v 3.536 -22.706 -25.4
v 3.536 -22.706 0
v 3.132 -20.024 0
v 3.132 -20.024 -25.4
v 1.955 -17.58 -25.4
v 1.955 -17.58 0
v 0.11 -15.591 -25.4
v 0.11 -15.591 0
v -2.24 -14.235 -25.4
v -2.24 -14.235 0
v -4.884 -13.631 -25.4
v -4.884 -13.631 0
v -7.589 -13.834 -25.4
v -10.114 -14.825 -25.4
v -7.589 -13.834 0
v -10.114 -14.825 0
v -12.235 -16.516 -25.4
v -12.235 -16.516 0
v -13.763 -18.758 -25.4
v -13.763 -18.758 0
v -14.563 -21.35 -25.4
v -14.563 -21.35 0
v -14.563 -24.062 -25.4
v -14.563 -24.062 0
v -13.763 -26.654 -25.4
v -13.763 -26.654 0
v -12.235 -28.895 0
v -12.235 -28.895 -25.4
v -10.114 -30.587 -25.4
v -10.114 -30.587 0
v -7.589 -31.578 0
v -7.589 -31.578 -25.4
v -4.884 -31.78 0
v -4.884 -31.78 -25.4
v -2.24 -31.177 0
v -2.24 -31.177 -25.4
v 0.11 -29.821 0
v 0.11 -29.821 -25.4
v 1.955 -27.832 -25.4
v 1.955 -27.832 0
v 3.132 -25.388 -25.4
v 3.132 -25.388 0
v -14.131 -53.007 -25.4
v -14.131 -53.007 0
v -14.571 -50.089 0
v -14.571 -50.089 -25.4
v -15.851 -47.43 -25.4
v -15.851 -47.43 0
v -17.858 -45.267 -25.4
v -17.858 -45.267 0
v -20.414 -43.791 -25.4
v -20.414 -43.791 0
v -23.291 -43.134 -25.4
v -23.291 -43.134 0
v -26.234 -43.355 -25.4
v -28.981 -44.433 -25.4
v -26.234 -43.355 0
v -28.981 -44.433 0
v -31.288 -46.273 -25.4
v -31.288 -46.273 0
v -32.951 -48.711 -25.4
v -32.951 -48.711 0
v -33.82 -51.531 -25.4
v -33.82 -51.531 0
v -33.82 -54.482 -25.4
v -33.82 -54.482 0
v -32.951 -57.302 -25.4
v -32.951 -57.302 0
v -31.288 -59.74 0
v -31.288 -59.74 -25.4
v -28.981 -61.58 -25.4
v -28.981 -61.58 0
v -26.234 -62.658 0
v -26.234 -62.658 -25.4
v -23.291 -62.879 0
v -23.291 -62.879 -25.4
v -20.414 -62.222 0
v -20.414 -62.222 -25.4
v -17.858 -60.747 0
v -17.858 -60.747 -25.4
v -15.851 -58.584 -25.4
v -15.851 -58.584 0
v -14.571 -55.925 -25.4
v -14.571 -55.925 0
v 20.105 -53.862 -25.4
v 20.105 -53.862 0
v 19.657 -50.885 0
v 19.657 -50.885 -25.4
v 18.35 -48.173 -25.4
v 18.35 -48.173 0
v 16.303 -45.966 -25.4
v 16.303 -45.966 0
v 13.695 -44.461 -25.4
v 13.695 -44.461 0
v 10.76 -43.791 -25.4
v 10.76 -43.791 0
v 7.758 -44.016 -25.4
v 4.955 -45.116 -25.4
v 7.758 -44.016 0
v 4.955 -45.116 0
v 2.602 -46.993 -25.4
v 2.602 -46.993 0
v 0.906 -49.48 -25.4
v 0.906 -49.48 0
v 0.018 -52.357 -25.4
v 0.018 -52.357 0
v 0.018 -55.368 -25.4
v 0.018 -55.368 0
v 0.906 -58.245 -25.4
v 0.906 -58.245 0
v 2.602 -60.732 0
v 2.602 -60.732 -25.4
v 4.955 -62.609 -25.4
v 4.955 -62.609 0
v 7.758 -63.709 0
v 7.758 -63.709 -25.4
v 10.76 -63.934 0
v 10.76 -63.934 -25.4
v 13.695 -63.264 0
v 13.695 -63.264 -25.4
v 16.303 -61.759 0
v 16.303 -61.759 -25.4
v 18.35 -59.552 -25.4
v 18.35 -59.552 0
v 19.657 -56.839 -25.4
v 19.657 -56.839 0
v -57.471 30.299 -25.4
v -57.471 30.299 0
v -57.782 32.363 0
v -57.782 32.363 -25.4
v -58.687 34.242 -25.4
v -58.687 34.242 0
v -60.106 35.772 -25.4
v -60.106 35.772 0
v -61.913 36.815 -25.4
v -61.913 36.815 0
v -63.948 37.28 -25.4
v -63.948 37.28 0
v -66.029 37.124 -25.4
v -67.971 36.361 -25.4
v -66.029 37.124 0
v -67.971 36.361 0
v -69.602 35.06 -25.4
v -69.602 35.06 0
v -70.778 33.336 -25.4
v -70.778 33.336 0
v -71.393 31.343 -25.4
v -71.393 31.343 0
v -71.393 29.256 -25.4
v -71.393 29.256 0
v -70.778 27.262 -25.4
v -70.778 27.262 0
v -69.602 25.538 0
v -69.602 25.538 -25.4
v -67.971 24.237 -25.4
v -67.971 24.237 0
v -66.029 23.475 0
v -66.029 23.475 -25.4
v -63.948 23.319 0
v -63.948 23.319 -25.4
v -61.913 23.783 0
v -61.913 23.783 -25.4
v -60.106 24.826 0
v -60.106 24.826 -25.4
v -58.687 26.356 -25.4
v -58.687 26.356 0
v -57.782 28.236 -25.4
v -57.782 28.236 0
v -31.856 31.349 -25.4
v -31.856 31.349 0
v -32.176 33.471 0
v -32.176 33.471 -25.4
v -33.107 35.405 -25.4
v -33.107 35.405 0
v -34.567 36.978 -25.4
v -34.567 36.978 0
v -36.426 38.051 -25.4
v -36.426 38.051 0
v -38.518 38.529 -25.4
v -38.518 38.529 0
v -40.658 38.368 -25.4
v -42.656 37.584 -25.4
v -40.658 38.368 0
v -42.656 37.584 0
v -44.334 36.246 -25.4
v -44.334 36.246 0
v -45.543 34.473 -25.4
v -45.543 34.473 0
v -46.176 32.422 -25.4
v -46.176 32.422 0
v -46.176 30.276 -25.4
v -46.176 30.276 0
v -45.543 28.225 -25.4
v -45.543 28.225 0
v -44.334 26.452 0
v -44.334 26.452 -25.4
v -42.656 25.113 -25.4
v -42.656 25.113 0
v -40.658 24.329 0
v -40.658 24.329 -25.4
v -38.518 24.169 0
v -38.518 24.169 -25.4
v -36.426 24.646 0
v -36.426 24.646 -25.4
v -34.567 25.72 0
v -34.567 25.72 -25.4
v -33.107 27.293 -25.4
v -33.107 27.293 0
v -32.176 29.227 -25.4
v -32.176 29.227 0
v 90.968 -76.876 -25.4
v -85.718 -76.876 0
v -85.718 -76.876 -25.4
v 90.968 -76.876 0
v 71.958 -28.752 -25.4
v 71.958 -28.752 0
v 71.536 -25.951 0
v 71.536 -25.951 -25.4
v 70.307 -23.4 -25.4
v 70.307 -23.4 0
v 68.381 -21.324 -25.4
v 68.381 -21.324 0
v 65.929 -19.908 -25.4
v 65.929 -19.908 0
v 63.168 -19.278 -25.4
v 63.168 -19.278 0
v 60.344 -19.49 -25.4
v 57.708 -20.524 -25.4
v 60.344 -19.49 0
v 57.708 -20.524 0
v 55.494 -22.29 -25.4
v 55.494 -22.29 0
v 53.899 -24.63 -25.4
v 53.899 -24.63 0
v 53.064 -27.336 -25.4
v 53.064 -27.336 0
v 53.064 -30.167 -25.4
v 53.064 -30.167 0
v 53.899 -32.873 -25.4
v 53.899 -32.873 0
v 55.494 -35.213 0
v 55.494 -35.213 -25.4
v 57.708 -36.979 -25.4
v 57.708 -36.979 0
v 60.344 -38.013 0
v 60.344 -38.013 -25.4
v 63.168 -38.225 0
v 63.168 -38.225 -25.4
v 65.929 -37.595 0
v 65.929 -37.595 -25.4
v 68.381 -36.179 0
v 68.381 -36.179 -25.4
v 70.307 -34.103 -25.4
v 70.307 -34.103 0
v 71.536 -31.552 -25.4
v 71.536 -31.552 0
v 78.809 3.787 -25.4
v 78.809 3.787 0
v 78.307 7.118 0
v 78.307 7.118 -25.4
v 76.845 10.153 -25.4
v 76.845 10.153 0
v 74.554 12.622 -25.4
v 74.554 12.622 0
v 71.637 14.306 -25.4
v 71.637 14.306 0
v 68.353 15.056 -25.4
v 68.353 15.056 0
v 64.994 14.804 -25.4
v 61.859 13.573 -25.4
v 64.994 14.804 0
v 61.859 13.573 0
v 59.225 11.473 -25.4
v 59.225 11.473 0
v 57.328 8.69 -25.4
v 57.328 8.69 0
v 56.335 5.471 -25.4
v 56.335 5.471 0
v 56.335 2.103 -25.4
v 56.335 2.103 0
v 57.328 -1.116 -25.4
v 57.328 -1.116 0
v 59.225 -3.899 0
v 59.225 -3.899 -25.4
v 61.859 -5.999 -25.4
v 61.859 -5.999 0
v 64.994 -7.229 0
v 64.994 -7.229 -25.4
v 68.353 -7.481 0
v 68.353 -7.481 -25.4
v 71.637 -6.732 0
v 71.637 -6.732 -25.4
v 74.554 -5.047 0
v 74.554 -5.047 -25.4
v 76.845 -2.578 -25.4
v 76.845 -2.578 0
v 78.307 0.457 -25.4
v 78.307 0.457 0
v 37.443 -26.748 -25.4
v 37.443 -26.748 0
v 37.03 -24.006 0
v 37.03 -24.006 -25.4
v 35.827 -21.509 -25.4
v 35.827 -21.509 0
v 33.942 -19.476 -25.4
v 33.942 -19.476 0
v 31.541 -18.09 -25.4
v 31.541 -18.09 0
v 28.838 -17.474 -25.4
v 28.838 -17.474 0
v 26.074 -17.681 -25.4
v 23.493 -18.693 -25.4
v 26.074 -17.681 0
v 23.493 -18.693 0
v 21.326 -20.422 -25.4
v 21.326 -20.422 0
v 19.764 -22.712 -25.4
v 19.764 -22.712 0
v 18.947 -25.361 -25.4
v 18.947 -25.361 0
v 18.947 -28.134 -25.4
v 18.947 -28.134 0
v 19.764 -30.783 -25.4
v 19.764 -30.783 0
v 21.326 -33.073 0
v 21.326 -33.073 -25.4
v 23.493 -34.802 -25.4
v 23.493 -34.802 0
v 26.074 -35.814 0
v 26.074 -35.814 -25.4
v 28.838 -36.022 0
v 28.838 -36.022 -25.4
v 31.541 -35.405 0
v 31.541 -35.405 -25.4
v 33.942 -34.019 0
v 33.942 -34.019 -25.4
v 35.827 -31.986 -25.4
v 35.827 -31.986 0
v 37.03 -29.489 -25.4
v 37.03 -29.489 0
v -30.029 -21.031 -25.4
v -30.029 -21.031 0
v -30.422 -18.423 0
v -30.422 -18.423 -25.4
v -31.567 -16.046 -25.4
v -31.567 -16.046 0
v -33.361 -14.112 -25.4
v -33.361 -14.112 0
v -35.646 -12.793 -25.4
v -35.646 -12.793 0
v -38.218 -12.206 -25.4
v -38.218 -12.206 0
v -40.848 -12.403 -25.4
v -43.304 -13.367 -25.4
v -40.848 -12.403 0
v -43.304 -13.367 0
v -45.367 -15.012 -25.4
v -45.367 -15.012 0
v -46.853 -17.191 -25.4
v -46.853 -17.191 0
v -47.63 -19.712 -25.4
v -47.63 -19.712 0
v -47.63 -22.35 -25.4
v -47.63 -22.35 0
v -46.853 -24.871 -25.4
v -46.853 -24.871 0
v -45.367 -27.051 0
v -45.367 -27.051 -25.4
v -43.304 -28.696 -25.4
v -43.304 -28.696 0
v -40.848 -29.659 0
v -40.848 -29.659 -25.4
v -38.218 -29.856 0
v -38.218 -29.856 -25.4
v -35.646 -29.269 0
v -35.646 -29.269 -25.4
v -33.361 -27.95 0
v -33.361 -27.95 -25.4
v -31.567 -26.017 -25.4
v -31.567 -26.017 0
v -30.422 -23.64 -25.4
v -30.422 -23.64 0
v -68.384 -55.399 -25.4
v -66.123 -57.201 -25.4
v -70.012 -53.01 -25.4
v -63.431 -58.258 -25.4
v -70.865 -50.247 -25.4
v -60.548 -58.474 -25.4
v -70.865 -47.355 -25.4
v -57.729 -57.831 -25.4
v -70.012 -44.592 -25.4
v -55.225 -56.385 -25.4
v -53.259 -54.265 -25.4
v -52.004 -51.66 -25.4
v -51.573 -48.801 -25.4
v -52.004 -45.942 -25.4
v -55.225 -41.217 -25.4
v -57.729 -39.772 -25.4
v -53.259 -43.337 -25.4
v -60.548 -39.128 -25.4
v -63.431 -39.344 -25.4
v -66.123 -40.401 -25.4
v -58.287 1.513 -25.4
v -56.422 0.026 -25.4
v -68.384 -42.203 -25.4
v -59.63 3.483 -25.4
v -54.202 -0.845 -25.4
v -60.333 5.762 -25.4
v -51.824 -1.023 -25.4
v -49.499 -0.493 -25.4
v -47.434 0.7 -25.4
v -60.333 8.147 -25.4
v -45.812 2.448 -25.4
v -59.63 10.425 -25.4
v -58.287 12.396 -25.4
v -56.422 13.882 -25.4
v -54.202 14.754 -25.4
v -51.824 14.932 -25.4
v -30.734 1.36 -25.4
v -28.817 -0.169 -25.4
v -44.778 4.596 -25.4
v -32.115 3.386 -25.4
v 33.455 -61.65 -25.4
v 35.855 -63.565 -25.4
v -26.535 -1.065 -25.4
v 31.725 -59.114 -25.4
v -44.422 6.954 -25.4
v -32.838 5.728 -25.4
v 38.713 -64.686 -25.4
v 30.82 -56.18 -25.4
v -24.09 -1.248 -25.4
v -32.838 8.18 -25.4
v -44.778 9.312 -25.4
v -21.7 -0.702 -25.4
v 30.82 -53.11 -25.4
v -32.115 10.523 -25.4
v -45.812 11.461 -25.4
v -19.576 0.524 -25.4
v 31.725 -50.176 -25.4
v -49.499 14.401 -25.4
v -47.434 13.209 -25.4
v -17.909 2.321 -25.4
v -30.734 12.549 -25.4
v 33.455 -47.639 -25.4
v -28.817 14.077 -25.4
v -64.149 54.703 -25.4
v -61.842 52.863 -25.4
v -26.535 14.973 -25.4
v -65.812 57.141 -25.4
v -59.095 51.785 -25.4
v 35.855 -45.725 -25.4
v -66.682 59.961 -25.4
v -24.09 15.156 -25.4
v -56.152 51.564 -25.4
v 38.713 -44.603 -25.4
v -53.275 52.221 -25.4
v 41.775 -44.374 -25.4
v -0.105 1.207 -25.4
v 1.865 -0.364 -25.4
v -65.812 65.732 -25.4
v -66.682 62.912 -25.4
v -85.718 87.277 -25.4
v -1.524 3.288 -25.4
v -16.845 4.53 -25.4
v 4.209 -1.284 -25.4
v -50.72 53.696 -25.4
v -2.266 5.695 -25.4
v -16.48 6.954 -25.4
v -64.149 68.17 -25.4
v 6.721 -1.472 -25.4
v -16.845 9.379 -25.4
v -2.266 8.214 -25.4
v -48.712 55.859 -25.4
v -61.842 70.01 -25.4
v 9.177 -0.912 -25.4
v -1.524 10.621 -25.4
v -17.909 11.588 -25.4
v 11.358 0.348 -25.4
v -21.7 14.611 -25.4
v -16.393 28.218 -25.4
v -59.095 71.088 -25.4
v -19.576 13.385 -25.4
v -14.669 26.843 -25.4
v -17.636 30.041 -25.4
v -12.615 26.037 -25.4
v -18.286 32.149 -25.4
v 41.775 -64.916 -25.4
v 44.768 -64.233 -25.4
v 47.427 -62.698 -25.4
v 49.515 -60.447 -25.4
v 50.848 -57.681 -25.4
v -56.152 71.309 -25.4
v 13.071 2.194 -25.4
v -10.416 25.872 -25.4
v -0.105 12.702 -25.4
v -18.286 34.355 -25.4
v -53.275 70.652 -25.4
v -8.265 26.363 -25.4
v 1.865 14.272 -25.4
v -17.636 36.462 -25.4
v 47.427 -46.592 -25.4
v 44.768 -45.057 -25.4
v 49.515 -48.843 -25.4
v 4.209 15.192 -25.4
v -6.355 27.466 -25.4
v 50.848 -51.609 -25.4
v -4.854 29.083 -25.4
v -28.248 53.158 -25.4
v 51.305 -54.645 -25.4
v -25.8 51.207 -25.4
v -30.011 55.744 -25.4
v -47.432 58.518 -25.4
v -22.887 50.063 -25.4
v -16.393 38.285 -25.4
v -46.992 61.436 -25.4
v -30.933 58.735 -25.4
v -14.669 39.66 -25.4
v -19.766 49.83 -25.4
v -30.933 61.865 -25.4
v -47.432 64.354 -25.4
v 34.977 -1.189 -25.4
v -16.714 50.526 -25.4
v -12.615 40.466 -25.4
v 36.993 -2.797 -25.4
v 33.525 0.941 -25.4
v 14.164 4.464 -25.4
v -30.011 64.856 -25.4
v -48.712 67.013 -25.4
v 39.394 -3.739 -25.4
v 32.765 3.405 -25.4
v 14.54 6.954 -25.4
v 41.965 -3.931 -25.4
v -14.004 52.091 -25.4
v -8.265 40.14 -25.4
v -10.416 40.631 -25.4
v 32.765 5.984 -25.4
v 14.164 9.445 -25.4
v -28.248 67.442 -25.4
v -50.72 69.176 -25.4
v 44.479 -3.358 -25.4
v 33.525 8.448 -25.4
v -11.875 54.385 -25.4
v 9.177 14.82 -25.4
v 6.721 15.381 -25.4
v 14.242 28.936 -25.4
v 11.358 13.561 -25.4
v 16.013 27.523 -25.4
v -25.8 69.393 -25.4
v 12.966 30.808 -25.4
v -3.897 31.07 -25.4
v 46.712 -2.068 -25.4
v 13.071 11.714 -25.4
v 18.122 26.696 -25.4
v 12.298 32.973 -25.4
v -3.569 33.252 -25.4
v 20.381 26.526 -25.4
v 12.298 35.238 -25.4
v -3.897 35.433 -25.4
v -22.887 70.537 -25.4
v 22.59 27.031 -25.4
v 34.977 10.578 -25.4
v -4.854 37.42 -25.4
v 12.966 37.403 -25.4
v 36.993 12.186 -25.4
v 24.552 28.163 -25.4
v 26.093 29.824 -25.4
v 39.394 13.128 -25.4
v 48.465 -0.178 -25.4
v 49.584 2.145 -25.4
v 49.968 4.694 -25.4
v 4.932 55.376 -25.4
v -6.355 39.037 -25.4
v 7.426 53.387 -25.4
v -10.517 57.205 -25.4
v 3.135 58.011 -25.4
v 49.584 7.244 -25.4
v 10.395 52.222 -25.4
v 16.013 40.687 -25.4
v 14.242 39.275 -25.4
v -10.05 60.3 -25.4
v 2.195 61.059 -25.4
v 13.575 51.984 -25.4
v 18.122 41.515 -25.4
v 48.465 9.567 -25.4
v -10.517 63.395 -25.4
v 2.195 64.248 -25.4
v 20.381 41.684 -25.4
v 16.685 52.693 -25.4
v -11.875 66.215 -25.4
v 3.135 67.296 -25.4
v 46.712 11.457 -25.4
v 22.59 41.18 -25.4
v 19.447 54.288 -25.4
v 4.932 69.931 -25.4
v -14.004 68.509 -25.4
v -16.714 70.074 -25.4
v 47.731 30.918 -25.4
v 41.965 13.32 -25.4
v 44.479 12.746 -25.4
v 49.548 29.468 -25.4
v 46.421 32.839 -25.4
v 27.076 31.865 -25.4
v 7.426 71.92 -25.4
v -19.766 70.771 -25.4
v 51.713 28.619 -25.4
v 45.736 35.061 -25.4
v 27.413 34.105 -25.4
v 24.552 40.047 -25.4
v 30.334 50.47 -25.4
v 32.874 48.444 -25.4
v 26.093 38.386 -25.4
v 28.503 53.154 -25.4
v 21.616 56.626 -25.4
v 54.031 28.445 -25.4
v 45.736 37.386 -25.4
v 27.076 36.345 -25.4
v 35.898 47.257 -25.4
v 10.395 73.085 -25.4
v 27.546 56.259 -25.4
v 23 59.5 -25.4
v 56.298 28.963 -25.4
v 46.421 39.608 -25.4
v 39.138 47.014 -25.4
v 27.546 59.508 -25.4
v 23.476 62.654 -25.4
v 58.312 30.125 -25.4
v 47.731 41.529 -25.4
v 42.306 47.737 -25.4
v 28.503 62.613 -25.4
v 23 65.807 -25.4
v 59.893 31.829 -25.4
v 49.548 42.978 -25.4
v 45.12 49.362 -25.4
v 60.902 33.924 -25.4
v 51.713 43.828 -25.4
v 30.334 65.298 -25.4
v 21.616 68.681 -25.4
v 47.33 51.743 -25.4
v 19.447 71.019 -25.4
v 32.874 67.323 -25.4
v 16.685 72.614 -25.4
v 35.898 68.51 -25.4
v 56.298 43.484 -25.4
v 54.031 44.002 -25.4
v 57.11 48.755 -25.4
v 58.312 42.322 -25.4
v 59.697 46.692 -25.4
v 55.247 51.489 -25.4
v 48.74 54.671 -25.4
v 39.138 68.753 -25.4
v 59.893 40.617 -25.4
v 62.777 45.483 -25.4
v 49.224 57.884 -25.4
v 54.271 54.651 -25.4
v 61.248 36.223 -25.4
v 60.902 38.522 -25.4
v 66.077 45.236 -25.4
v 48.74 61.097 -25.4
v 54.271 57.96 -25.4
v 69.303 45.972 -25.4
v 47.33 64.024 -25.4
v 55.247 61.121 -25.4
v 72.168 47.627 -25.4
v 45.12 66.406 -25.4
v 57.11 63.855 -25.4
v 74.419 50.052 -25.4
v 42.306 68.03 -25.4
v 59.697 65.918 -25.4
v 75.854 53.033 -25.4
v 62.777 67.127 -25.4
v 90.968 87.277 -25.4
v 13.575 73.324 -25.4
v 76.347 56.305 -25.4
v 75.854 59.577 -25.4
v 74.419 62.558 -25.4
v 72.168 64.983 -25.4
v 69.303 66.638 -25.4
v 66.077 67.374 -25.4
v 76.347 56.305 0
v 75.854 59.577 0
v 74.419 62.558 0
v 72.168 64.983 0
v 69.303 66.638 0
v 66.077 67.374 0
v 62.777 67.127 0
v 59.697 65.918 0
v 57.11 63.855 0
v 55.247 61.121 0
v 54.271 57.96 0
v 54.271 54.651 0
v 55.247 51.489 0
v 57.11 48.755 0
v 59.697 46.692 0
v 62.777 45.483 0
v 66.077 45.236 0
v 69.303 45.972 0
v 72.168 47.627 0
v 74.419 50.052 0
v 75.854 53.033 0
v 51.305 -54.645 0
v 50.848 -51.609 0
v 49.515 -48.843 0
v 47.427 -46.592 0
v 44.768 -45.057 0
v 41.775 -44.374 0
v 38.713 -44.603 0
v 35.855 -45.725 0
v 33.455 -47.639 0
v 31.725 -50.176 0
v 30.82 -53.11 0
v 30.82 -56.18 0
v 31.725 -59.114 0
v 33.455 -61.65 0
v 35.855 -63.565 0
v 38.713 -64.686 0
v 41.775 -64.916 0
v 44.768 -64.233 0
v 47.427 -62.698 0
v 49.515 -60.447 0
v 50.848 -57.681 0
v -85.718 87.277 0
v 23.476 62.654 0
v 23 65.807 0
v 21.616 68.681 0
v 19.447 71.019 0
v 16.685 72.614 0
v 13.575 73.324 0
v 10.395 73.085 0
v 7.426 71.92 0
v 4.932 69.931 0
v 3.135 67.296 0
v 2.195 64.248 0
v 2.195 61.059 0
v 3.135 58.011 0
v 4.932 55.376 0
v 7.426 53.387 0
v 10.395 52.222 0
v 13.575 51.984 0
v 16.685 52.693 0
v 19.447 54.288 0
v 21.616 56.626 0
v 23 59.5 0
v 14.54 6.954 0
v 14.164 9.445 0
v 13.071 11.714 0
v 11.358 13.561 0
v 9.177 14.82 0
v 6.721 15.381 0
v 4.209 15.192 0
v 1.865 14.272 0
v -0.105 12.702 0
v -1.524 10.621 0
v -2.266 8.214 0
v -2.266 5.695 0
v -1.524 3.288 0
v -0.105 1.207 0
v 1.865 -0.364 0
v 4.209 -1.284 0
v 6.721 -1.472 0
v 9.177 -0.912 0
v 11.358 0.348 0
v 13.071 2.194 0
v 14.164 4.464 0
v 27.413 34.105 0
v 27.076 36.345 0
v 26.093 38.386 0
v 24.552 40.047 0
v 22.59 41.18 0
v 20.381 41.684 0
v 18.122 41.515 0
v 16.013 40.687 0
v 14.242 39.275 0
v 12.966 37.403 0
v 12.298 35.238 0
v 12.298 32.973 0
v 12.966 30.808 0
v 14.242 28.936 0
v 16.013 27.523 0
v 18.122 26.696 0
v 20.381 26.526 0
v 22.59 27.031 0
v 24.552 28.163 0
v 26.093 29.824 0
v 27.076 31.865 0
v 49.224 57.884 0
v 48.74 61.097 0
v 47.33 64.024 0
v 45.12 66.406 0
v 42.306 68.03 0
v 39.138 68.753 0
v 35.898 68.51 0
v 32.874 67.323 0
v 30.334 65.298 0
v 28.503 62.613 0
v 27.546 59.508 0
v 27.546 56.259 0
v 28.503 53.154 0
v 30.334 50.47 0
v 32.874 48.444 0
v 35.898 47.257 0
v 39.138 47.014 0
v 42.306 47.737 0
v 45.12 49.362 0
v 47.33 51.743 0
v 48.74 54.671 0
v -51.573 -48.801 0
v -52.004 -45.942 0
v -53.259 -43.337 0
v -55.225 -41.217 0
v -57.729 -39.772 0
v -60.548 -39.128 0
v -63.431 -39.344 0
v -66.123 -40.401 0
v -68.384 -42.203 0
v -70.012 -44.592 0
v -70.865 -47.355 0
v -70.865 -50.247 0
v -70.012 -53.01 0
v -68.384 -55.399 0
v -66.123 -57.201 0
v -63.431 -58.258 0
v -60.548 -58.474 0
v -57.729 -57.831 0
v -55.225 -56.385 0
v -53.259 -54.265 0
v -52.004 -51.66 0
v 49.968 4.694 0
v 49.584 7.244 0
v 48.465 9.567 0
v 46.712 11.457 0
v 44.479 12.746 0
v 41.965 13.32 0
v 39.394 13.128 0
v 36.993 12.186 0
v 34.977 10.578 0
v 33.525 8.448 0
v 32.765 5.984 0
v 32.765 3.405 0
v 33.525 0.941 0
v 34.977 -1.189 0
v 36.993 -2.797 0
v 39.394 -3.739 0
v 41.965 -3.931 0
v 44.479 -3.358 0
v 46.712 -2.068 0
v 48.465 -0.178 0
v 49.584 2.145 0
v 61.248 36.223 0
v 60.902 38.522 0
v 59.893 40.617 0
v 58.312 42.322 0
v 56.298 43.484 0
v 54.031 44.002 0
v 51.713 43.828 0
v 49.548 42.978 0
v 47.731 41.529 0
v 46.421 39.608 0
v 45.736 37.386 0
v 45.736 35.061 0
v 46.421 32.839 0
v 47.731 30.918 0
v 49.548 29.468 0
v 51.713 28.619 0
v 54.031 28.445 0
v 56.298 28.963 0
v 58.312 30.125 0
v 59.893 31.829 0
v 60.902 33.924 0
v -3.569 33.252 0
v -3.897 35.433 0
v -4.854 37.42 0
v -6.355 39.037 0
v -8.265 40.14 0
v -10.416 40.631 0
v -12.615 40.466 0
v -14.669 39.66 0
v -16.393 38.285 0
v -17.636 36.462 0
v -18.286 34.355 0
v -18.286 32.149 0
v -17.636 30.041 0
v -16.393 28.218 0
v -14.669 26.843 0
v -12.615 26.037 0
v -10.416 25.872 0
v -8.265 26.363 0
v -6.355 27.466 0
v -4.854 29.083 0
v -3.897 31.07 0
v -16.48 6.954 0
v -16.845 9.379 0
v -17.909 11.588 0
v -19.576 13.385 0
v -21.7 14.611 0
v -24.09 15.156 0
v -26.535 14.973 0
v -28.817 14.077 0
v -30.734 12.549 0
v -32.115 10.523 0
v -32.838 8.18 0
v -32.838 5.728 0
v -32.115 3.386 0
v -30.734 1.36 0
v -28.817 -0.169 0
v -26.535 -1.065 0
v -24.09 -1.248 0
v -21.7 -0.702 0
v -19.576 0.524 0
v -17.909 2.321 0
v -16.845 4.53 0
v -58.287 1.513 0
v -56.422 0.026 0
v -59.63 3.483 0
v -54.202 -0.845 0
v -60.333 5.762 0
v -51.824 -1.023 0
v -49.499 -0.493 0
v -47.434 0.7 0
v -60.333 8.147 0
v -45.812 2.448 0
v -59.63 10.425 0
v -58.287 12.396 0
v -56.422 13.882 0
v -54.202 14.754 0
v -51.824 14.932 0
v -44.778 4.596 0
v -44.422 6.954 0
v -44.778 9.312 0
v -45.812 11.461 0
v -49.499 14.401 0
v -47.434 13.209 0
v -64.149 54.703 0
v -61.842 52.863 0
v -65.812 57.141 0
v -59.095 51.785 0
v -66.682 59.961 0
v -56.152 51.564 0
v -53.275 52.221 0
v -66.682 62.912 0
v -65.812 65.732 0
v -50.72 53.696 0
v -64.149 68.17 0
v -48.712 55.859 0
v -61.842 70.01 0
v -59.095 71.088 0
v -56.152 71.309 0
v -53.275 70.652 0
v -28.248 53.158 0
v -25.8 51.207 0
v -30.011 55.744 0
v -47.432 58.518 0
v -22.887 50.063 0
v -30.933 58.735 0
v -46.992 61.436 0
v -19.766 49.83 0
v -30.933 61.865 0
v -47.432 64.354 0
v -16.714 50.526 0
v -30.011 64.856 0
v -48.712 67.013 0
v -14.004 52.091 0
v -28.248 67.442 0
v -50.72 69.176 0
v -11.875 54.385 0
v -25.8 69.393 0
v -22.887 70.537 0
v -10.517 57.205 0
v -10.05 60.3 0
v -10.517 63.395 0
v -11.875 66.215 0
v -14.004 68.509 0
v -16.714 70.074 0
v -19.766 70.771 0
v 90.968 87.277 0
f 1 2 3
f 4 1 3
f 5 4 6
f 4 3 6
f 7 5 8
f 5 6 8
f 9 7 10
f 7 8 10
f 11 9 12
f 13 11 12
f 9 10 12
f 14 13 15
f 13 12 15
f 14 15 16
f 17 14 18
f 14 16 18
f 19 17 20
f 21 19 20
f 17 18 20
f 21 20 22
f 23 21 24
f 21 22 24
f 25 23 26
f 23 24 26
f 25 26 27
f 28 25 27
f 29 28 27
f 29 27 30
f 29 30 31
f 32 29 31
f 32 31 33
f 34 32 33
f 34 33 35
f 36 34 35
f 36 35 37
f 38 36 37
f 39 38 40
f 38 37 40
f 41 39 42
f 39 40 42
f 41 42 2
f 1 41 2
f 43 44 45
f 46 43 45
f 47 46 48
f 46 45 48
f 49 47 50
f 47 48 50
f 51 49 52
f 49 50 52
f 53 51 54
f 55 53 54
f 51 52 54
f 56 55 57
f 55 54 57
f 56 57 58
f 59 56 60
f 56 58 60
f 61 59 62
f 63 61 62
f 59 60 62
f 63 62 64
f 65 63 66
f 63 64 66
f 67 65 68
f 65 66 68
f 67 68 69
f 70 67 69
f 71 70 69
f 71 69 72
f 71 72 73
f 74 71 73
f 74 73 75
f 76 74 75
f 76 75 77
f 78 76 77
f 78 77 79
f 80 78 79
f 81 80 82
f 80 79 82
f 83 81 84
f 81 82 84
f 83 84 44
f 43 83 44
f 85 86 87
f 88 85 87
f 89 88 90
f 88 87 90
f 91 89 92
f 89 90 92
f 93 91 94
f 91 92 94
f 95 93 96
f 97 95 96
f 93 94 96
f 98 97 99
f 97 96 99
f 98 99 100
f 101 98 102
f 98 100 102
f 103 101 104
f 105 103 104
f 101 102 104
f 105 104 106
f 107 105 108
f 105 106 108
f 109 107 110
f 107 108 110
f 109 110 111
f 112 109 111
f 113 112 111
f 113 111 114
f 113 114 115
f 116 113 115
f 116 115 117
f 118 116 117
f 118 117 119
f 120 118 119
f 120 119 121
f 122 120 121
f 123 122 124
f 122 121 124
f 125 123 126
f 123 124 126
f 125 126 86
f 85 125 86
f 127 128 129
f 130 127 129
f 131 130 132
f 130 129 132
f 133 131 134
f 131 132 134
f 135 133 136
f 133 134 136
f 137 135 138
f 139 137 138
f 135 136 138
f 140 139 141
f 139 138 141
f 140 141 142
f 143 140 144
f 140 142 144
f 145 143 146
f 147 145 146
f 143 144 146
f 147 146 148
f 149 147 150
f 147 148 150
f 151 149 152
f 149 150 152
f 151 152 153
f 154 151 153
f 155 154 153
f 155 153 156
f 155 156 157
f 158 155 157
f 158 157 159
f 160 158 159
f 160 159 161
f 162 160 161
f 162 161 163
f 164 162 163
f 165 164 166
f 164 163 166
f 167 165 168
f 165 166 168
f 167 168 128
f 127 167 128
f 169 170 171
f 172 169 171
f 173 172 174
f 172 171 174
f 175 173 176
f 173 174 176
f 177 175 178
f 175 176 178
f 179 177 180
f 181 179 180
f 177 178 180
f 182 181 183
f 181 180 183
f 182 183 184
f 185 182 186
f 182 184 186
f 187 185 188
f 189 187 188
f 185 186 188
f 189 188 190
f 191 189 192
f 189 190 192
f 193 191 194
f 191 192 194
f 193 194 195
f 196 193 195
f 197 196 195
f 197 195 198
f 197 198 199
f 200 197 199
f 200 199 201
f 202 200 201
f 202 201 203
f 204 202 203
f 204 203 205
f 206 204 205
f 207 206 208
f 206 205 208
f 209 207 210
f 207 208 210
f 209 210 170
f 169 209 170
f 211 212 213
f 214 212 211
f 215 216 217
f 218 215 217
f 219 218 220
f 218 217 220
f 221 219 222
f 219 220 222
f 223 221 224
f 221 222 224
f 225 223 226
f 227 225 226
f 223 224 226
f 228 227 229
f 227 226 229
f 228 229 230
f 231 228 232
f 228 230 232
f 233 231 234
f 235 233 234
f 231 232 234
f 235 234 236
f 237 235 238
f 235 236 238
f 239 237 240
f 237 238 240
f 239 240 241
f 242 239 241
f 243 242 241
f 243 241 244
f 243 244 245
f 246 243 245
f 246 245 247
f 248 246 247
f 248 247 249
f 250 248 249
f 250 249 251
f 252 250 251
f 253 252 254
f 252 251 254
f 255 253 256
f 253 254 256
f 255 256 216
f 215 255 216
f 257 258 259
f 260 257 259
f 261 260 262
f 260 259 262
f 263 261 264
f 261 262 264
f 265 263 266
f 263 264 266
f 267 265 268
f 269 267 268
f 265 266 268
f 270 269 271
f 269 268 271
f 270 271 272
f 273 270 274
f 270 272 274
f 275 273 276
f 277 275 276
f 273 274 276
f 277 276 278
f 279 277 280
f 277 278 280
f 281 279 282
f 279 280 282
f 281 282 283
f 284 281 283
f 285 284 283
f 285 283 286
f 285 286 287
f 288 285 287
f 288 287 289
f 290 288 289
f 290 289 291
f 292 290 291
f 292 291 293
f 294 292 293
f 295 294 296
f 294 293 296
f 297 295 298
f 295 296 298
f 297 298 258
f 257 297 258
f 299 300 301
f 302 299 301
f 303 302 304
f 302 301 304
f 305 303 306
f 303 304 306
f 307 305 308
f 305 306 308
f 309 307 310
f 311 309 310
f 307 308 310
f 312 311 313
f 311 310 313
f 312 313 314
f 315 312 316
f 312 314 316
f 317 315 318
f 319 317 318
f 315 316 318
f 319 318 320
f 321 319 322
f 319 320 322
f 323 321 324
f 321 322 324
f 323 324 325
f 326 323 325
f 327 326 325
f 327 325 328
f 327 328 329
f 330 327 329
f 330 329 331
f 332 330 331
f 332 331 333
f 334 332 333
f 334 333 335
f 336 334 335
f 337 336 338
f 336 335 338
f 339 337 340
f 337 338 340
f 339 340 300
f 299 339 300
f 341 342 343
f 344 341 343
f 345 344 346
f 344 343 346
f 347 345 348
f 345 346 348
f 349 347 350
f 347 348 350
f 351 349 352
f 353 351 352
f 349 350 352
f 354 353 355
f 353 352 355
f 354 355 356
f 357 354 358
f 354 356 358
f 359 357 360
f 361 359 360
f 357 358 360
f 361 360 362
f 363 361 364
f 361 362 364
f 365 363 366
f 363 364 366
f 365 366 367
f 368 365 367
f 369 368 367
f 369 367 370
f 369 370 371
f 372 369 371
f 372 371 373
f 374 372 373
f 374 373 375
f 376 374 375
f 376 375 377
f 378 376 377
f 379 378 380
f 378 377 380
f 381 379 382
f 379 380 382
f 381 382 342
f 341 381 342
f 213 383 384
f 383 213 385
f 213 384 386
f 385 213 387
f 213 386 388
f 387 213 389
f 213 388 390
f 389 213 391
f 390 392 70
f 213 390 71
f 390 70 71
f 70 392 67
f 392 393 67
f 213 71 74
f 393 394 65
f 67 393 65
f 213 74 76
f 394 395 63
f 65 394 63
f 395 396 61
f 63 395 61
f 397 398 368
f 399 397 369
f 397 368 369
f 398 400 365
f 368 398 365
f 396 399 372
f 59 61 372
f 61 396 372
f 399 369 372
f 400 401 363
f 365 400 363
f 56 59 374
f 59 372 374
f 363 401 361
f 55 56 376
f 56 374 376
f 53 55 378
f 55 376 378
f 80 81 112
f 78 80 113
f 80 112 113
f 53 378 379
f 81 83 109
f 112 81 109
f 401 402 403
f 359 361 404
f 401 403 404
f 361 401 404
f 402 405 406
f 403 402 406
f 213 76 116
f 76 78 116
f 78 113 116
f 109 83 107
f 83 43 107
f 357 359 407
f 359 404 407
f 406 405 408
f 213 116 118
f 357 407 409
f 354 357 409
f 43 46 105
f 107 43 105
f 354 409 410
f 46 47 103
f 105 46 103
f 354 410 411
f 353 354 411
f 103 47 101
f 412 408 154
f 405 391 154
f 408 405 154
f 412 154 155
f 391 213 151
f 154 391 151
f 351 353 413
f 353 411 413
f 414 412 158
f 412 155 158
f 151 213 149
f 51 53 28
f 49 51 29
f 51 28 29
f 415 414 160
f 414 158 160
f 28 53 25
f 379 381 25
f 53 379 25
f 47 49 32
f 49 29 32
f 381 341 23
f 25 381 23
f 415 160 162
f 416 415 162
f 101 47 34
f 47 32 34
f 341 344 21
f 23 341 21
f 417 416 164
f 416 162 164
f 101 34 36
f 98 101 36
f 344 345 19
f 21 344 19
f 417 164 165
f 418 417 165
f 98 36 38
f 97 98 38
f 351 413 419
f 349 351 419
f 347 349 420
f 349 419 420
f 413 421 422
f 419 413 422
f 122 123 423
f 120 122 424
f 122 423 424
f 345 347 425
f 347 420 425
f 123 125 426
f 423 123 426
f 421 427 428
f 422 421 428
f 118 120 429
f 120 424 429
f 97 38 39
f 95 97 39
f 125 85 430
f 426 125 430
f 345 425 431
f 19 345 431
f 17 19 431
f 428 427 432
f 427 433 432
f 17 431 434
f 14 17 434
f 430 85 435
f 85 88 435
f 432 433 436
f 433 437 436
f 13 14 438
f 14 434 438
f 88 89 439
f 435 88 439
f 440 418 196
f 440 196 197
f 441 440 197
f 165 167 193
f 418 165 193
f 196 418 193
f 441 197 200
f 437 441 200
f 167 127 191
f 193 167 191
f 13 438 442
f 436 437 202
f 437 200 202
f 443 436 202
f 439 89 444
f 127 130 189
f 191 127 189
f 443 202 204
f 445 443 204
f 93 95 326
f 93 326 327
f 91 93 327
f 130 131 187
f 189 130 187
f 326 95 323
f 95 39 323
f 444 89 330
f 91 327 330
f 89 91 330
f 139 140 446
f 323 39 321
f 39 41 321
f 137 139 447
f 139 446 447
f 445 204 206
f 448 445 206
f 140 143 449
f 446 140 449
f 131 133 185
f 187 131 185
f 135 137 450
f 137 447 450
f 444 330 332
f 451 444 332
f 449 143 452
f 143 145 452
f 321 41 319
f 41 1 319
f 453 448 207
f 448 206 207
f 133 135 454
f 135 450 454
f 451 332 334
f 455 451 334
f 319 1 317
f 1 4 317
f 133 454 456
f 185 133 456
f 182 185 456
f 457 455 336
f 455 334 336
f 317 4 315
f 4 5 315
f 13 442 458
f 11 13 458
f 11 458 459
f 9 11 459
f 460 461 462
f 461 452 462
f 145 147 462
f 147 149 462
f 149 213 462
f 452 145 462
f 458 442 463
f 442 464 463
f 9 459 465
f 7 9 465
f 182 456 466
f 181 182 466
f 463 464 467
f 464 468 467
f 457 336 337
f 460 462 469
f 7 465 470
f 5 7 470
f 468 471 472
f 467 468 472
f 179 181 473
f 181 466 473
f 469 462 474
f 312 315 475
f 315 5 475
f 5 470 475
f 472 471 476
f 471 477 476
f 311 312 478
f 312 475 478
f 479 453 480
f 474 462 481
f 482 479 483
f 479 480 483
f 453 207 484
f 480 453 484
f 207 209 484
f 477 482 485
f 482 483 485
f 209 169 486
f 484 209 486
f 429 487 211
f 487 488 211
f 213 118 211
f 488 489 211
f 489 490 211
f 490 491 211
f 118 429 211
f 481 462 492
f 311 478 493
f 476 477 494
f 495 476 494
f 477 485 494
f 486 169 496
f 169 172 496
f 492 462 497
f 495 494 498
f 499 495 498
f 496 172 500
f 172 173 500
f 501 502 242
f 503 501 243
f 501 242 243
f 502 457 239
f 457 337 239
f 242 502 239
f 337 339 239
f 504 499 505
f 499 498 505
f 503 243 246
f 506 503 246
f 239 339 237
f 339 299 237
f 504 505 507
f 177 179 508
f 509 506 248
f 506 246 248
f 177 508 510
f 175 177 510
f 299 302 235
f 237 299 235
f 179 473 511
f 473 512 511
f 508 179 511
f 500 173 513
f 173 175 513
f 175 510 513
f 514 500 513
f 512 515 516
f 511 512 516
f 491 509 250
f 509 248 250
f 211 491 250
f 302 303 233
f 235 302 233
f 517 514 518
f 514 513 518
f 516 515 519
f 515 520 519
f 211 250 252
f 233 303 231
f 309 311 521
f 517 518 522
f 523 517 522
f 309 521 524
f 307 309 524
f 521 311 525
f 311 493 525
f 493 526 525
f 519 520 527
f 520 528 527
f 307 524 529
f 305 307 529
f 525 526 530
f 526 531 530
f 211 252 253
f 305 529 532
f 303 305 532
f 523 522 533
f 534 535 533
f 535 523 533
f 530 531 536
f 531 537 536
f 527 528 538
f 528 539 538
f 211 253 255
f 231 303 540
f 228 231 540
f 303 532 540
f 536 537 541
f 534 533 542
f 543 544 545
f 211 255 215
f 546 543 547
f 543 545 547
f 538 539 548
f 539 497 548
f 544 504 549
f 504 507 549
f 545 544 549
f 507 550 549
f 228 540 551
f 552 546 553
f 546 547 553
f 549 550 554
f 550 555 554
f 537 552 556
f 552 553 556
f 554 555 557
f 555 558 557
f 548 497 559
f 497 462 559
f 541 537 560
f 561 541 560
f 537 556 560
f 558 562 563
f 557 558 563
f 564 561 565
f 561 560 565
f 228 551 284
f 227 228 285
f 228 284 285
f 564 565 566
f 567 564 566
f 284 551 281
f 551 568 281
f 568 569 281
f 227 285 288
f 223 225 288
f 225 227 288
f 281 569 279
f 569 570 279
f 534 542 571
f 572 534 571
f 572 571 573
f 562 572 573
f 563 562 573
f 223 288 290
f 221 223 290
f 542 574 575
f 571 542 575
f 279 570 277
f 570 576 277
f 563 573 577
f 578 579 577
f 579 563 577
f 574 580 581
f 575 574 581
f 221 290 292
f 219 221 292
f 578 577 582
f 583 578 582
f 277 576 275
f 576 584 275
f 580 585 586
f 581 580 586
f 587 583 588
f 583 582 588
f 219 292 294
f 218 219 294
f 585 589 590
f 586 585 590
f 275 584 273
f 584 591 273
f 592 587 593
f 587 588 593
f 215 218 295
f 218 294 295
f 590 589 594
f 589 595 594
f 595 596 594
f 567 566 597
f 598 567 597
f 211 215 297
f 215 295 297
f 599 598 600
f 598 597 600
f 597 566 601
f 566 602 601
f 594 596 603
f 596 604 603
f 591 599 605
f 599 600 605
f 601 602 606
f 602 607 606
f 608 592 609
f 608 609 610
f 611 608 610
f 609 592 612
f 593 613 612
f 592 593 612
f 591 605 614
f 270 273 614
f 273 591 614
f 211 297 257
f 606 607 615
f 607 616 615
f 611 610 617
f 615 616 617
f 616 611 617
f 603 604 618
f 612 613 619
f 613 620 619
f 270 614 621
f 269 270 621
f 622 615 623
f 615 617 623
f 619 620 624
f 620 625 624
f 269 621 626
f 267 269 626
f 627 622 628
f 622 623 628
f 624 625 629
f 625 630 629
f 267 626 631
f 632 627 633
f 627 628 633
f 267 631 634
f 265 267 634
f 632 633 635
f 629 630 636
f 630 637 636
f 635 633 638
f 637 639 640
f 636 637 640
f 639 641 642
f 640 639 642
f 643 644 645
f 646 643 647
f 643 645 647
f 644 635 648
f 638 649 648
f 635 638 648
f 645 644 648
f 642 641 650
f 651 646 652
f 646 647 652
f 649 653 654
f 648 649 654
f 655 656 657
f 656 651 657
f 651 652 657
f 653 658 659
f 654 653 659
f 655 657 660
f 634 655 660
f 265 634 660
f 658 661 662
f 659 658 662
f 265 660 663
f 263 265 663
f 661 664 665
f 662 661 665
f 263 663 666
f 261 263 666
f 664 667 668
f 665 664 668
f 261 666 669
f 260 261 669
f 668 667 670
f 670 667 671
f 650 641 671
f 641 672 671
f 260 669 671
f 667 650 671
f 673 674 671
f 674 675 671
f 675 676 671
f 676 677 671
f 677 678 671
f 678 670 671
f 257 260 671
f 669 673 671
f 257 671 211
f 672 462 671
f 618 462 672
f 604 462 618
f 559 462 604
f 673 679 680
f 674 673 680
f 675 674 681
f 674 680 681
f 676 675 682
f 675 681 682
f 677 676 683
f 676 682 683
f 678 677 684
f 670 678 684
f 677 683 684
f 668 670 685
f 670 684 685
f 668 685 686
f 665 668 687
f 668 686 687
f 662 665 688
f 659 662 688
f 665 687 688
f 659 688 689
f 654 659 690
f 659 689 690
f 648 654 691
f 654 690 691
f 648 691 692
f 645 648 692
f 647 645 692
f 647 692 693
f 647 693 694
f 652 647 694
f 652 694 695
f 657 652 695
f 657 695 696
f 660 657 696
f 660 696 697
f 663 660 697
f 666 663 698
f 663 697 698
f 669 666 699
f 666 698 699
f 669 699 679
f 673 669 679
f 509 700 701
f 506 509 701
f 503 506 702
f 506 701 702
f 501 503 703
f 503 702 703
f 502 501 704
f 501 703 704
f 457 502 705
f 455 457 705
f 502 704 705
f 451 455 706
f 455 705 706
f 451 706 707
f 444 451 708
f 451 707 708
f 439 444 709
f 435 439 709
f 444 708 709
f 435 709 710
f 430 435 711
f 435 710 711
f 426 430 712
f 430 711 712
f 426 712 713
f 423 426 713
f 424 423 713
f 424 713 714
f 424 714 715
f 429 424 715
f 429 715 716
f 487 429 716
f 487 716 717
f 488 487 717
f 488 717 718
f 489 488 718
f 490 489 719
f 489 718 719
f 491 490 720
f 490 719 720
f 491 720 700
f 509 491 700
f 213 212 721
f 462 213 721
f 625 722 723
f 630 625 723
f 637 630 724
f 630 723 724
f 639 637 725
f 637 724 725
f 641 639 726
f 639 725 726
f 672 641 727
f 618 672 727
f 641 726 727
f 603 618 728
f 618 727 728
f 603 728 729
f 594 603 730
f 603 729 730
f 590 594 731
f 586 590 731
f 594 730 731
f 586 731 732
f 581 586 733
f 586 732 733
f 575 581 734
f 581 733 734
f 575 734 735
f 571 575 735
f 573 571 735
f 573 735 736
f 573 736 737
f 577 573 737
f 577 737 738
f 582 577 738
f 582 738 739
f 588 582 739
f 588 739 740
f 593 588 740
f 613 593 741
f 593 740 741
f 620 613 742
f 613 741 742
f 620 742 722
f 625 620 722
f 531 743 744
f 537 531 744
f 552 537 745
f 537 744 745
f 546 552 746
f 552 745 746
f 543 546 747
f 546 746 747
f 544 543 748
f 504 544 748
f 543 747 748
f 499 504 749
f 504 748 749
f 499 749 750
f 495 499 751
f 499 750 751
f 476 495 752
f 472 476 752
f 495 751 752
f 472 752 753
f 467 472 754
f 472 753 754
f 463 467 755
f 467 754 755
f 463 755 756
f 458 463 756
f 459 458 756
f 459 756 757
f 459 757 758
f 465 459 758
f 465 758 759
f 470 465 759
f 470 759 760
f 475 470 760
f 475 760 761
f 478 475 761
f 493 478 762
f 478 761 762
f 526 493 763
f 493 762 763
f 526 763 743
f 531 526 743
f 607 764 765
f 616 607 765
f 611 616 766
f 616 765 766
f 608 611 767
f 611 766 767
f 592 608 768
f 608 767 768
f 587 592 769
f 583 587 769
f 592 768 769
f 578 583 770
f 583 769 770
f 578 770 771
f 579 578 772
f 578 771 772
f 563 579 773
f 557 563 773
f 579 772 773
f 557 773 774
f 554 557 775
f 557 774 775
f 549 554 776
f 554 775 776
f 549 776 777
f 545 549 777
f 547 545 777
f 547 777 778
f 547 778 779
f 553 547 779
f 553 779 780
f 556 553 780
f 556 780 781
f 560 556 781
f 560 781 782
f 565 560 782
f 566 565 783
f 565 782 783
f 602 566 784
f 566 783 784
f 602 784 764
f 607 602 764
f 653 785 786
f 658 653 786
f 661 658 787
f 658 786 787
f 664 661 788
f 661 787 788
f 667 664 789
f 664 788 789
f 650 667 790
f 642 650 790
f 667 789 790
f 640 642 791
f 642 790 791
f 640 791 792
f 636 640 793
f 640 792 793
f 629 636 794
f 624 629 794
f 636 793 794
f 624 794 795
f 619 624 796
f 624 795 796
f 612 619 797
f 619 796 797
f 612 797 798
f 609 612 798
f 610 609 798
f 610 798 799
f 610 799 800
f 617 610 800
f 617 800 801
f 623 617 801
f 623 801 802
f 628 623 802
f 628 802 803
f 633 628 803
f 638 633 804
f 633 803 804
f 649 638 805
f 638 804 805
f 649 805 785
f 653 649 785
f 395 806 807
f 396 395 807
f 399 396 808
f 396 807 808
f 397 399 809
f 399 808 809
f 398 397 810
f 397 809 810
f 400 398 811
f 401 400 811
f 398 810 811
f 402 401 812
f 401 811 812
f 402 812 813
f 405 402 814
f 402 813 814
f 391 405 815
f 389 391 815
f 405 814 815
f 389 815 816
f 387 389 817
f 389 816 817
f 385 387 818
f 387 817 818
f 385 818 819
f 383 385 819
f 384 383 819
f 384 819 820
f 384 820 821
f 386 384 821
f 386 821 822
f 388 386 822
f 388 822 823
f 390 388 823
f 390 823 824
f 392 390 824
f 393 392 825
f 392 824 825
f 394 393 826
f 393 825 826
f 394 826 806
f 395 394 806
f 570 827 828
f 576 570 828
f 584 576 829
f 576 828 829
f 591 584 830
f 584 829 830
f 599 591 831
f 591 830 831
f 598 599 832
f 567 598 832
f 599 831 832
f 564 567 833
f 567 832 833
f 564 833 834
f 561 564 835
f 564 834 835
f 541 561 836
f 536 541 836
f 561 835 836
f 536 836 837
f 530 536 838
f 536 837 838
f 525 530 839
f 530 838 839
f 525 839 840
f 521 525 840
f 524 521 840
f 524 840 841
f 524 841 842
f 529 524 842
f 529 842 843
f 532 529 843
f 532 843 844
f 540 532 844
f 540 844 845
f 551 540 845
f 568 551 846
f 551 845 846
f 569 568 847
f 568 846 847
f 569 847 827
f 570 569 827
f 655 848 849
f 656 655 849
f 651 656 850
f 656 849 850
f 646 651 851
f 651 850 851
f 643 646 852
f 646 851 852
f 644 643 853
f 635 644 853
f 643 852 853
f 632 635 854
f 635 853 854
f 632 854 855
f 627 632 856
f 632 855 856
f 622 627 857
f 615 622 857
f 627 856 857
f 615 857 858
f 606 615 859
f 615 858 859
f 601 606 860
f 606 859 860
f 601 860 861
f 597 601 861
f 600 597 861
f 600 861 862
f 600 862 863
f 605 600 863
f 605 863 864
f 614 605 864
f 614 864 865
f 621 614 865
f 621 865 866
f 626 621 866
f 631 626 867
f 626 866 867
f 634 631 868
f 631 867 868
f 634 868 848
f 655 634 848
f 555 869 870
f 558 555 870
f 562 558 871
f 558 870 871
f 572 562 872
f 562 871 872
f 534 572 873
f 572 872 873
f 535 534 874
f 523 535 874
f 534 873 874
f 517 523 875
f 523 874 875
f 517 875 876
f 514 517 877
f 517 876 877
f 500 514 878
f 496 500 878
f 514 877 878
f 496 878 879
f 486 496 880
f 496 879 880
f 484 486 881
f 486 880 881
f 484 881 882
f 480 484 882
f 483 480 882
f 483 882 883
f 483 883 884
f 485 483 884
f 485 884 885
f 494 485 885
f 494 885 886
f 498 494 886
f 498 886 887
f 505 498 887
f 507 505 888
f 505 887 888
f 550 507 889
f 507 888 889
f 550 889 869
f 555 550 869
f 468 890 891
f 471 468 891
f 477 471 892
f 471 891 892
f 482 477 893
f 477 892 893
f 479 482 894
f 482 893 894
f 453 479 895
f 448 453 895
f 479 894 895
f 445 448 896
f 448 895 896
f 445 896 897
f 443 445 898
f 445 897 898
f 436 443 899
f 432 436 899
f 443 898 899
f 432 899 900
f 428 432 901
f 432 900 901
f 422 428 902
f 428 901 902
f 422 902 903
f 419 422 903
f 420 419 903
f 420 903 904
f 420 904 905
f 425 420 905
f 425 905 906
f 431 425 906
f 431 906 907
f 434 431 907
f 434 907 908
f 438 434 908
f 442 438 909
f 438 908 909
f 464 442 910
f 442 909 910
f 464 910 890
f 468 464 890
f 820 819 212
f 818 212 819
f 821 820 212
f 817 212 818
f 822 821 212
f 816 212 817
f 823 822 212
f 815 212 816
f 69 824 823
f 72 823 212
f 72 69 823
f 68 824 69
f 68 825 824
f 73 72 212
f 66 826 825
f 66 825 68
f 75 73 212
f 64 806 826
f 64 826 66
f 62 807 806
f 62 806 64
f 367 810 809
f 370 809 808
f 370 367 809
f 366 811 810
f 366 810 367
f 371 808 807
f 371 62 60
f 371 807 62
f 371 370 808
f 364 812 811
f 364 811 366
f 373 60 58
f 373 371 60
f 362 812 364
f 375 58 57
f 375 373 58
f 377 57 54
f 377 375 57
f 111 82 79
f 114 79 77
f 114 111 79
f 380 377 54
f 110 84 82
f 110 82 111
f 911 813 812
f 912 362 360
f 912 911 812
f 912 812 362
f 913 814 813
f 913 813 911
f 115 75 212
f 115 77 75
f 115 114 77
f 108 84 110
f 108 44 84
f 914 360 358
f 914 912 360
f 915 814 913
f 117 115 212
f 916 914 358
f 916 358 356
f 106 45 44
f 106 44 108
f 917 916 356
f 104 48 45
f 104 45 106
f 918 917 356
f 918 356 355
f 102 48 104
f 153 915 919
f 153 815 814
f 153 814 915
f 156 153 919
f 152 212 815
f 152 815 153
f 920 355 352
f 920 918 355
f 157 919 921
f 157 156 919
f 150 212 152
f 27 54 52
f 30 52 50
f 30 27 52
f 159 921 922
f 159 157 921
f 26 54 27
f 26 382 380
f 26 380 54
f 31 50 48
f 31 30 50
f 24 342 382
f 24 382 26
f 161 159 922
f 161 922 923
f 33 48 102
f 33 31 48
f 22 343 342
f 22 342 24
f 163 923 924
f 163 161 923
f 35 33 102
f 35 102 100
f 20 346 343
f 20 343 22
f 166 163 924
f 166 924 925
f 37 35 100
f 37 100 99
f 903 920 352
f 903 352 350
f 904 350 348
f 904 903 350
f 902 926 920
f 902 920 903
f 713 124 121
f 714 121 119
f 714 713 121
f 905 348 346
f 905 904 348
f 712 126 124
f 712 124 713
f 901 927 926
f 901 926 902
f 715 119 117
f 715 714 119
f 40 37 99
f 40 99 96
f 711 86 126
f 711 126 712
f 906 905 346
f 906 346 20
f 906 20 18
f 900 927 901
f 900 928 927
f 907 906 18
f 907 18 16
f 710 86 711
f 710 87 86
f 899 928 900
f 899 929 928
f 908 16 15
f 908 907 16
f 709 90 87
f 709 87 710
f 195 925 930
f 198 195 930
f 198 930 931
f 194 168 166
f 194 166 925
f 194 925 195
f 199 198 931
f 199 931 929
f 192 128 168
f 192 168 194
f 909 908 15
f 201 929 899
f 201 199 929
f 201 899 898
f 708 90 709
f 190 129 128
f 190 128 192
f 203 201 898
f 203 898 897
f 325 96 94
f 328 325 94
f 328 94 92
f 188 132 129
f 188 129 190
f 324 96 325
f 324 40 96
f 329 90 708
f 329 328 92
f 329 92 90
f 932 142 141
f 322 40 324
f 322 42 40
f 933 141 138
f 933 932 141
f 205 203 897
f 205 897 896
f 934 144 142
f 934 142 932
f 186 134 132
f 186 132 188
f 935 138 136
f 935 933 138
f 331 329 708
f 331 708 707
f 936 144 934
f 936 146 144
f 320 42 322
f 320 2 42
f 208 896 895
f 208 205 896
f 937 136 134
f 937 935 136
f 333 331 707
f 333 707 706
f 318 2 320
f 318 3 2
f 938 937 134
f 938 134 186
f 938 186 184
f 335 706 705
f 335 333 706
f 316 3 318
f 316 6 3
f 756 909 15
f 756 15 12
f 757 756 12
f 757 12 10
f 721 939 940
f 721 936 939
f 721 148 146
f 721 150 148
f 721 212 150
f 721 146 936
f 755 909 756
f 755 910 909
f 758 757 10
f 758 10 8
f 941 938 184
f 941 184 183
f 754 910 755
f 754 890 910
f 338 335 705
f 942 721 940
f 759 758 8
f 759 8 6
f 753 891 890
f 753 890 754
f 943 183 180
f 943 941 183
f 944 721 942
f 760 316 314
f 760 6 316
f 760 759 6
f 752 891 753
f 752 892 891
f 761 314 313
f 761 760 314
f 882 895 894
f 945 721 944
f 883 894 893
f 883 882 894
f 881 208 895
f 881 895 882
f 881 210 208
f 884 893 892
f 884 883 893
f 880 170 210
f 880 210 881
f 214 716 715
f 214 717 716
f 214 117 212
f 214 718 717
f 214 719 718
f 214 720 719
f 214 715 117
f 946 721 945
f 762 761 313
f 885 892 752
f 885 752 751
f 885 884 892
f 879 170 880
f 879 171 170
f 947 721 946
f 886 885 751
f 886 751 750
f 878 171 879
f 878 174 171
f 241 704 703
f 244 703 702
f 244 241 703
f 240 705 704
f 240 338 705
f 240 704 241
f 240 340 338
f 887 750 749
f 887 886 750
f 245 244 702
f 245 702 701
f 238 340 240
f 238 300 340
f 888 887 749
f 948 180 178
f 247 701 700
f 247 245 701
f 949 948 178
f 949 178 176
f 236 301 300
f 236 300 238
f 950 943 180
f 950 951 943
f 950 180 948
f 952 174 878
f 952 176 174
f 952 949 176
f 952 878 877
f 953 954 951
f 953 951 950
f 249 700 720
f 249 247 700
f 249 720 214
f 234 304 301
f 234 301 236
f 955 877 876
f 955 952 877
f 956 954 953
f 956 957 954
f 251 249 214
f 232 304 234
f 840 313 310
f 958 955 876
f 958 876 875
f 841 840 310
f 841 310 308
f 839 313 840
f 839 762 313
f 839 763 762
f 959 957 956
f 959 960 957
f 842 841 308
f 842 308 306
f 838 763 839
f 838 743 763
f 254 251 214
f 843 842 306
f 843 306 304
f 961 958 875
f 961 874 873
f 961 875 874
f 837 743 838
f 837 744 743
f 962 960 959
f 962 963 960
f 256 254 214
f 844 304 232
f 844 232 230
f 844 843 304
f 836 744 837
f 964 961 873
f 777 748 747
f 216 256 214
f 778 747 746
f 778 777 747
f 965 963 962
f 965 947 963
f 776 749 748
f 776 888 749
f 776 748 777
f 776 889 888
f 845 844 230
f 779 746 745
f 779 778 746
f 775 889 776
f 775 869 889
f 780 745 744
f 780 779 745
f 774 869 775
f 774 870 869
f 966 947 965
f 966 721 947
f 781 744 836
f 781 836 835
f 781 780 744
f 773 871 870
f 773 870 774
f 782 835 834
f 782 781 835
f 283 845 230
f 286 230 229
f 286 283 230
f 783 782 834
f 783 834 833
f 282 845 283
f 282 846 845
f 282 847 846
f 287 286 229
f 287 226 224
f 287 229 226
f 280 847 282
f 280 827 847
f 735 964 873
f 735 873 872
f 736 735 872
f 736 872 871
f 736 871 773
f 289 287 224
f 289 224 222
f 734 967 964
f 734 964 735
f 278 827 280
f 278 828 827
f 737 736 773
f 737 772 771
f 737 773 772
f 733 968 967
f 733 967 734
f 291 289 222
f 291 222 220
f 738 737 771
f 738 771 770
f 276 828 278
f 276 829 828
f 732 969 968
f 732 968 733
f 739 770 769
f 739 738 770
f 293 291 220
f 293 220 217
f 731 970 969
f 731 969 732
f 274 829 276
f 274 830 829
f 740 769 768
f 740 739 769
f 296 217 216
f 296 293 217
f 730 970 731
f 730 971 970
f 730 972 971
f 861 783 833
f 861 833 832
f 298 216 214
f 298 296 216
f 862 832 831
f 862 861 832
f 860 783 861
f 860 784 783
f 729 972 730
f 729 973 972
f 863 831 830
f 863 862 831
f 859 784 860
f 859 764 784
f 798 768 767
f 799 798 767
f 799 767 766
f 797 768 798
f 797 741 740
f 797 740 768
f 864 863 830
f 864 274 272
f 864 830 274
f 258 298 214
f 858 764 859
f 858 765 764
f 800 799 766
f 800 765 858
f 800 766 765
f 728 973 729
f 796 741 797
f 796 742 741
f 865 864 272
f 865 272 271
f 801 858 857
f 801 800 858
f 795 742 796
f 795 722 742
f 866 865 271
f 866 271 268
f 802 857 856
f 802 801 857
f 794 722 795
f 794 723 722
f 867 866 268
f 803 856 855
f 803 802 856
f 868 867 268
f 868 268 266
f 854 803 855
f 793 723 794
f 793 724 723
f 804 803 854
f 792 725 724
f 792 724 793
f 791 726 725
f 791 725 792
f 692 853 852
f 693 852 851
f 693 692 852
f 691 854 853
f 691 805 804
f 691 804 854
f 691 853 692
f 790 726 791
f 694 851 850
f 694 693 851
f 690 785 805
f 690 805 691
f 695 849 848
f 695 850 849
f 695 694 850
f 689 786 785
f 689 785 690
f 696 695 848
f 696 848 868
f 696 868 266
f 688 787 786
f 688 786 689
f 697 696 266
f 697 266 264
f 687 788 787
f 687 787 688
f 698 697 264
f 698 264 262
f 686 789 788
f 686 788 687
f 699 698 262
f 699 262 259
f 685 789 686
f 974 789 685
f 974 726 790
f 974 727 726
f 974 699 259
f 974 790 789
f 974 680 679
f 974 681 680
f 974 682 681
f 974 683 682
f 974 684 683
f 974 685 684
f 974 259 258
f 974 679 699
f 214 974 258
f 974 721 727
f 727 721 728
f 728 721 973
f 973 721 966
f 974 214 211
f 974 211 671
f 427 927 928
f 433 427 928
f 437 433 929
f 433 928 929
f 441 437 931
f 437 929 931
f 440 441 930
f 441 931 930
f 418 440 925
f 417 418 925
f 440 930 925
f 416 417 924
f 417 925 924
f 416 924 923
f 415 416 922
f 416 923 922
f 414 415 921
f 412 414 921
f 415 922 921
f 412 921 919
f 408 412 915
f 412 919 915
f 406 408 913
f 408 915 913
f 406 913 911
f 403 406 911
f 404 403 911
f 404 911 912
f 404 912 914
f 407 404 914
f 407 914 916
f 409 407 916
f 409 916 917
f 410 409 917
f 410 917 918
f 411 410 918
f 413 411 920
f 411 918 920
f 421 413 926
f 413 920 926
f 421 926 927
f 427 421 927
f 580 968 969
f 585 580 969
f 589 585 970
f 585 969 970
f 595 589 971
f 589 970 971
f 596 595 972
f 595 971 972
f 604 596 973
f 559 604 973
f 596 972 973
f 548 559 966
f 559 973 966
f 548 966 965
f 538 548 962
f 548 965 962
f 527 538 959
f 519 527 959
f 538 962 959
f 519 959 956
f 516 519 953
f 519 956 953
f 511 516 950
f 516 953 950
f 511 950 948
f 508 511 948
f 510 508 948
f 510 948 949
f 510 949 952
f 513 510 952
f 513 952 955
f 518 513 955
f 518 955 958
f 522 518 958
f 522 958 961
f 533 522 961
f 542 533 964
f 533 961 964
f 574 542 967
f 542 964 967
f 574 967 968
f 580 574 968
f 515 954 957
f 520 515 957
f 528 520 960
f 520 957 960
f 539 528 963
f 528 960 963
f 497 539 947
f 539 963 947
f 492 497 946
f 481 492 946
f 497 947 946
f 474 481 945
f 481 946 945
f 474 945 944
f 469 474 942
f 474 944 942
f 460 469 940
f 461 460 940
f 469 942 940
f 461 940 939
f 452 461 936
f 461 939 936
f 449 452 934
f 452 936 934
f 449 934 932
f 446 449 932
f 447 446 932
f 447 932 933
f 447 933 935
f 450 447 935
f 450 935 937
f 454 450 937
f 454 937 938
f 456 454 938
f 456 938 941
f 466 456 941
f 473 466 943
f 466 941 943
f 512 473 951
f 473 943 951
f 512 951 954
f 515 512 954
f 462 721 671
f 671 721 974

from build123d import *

# Parameters (mm, degrees)
F10_W     = 176.685878
F10_H     = 164.152801
F11_DEPTH = 25.4
F7_R      = 9.9
F12_DEPTH = 25.4
F8_R      = 10.5
F13_DEPTH = 25.4
F9_R      = 10.7
F14_DEPTH = 25.4
F0_R      = 7
F15_DEPTH = 25.4
F1_R      = 7.2
F16_DEPTH = 25.4
F3_R      = 7.6
F17_DEPTH = 25.4
F2_R      = 7.4
F18_DEPTH = 25.4
F4_R      = 7.8
F19_DEPTH = 25.4
F5_R      = 8
F5_R_2    = 8.225
F5_R_3    = 8.45
F5_R_4    = 8.65
F20_DEPTH = 25.4
F6_R      = 8.85
F6_R_2    = 9.1
F6_R_3    = 9.3
F6_R_4    = 9.5
F6_R_5    = 9.7
F6_R_6    = 9.9
F6_R_7    = 10.1
F6_R_8    = 10.3
F21_DEPTH = 25.4
F22_R     = 10.9
F23_DEPTH = 25.4
F24_R     = 11.1
F25_DEPTH = 25.4
F26_R     = 11.3
F27_DEPTH = 25.4


with BuildPart() as f11:
    # F10 (on Top) → F11 (new body)
    with BuildSketch(Plane.XY):
        with Locations((2.625104, 5.200521)):
            Rectangle(F10_W, F10_H)
    extrude(amount=-F11_DEPTH)

    # F7 (on Top) → F12 (cut)
    with BuildSketch(Plane.XY):
        with Locations((-56.892078, 61.436351)):
            Circle(F7_R)
    extrude(amount=-F12_DEPTH, mode=Mode.SUBTRACT)

    # F8 (on Top) → F13 (cut)
    with BuildSketch(Plane.XY):
        with Locations((-20.550484, 60.300212)):
            Circle(F8_R)
    extrude(amount=-F13_DEPTH, mode=Mode.SUBTRACT)

    # F9 (on Top) → F14 (cut)
    with BuildSketch(Plane.XY):
        with Locations((12.775544, 62.653594)):
            Circle(F9_R)
    extrude(amount=-F14_DEPTH, mode=Mode.SUBTRACT)

    # F0 (on Top) → F15 (cut)
    with BuildSketch(Plane.XY):
        with Locations((-64.470865, 30.299246)):
            Circle(F0_R)
    extrude(amount=-F15_DEPTH, mode=Mode.SUBTRACT)

    # F1 (on Top) → F16 (cut)
    with BuildSketch(Plane.XY):
        with Locations((-39.056268, 31.34875)):
            Circle(F1_R)
    extrude(amount=-F16_DEPTH, mode=Mode.SUBTRACT)

    # F3 (on Top) → F17 (cut)
    with BuildSketch(Plane.XY):
        with Locations((19.813331, 34.10523)):
            Circle(F3_R)
    extrude(amount=-F17_DEPTH, mode=Mode.SUBTRACT)

    # F2 (on Top) → F18 (cut)
    with BuildSketch(Plane.XY):
        with Locations((-10.968515, 33.251639)):
            Circle(F2_R)
    extrude(amount=-F18_DEPTH, mode=Mode.SUBTRACT)

    # F4 (on Top) → F19 (cut)
    with BuildSketch(Plane.XY):
        with Locations((53.448476, 36.223363)):
            Circle(F4_R)
    extrude(amount=-F19_DEPTH, mode=Mode.SUBTRACT)

    # F5 (on Top) → F20 (cut)
    with BuildSketch(Plane.XY):
        with Locations((-52.422121, 6.954235)):
            Circle(F5_R)
        with Locations((-24.704576, 6.954235)):
            Circle(F5_R_2)
        with Locations((6.08955, 6.954235)):
            Circle(F5_R_3)
        with Locations((41.318376, 4.69443)):
            Circle(F5_R_4)
    extrude(amount=-F20_DEPTH, mode=Mode.SUBTRACT)

    # F6 (on Top) → F21 (cut)
    with BuildSketch(Plane.XY):
        with Locations((-38.879134, -21.031195)):
            Circle(F6_R)
        with Locations((-5.56421, -22.705894)):
            Circle(F6_R_2)
        with Locations((28.14305, -26.74753)):
            Circle(F6_R_3)
        with Locations((62.45793, -28.751563)):
            Circle(F6_R_4)
        with Locations((-61.273046, -48.801046)):
            Circle(F6_R_5)
        with Locations((-24.030989, -53.006683)):
            Circle(F6_R_6)
        with Locations((10.005432, -53.862374)):
            Circle(F6_R_7)
        with Locations((41.005138, -54.6447)):
            Circle(F6_R_8)
    extrude(amount=-F21_DEPTH, mode=Mode.SUBTRACT)

    # F22 (on face) → F23 (cut)
    with BuildSketch(Plane.XY):
        with Locations((38.323849, 57.883684)):
            Circle(F22_R)
    extrude(amount=-F23_DEPTH, mode=Mode.SUBTRACT)

    # F24 (on face) → F25 (cut)
    with BuildSketch(Plane.XY):
        with Locations((65.247305, 56.305163)):
            Circle(F24_R)
    extrude(amount=-F25_DEPTH, mode=Mode.SUBTRACT)

    # F26 (on face) → F27 (cut)
    with BuildSketch(Plane.XY):
        with Locations((67.508779, 3.787257)):
            Circle(F26_R)
    extrude(amount=-F27_DEPTH, mode=Mode.SUBTRACT)


solid = f11.part
